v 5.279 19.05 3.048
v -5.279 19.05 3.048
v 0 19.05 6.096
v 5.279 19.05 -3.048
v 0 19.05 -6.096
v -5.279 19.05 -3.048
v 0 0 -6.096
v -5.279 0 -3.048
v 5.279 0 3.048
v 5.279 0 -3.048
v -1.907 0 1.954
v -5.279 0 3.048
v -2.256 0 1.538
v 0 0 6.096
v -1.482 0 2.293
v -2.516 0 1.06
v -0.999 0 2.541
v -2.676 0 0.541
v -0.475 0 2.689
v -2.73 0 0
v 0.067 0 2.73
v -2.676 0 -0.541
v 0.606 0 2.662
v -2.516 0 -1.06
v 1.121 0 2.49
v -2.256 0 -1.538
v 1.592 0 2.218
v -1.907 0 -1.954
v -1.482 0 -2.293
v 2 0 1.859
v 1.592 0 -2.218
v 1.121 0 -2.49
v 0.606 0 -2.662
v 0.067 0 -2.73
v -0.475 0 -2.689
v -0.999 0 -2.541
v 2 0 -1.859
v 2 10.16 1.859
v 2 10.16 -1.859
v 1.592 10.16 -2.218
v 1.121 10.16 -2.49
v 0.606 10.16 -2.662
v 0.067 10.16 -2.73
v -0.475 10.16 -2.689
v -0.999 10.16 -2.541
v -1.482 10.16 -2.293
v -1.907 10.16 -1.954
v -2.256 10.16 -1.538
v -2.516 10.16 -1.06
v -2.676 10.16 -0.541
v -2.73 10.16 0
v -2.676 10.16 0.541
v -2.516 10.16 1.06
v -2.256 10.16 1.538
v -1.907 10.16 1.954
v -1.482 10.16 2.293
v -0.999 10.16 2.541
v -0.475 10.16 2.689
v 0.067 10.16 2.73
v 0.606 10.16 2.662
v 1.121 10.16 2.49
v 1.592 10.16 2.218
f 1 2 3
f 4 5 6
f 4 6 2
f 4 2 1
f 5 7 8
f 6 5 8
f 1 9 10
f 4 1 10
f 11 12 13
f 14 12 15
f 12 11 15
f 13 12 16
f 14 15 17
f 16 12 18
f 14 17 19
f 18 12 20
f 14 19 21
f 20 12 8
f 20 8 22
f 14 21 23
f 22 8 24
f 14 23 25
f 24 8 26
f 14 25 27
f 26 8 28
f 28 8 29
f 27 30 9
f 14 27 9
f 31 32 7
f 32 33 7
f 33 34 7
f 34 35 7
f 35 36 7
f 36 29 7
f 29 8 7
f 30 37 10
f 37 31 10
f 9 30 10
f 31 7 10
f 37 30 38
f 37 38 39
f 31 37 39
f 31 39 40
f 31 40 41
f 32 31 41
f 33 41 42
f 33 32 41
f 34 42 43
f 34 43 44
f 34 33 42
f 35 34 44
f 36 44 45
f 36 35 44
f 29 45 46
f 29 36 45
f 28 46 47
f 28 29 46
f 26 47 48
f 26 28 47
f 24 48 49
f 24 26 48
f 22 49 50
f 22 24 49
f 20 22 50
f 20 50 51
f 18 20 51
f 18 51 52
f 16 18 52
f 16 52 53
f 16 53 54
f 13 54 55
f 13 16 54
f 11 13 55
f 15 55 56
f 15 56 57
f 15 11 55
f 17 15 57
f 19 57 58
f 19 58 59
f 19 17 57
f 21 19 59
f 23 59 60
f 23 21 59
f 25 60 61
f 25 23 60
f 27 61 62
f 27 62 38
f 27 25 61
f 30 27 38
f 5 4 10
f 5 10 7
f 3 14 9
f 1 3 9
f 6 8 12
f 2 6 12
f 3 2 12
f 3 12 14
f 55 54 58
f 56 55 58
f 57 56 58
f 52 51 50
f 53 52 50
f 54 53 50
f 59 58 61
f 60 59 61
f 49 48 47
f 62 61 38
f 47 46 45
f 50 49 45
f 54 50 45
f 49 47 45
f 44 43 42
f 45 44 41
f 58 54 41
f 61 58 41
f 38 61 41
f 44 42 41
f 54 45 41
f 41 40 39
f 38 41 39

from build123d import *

# Parameters (mm, degrees)
BOSS_EXTRUDE1_DEPTH = 19.05
CUT_EXTRUDE1_DEPTH  = 10.16


with BuildPart() as part:
    # Sketch1 → Boss-Extrude1 (new body)
    # profile 1 of 2: a face of its own
    with BuildSketch(Plane(origin=(0, 0, 0), x_dir=(1, 0, 0), z_dir=(0, 1, 0))):
        Polygon((0, 6.096), (-5.279290861, 3.048), (-5.279290861, -3.048), (0, -6.096), (5.279290861, -3.048), (5.279290861, 3.048), align=None)
        with BuildLine():
            ThreePointArc((2, 1.858932557), (-2.7305, 0), (2, -1.858932557))
            Line((2, -1.858932557), (2, 1.858932557))
        make_face(mode=Mode.SUBTRACT)
    # profile 2 of 2: a face of its own
    with BuildSketch(Plane(origin=(0, 0, 0), x_dir=(1, 0, 0), z_dir=(0, 1, 0))):
        with BuildLine():
            Line((2, -1.858932557), (2, 1.858932557))
            ThreePointArc((2, 1.858932557), (-2.7305, 0), (2, -1.858932557))
        make_face()
    extrude(amount=BOSS_EXTRUDE1_DEPTH)

    # Sketch1<3> → Cut-Extrude1 (cut)
    with BuildSketch(Plane(origin=(0, 0, 0), x_dir=(1, 0, 0), z_dir=(0, 1, 0))):
        with BuildLine():
            Line((2, -1.858932557), (2, 1.858932557))
            ThreePointArc((2, 1.858932557), (-2.7305, 0), (2, -1.858932557))
        make_face()
    extrude(amount=CUT_EXTRUDE1_DEPTH, mode=Mode.SUBTRACT)


solid = part.part
